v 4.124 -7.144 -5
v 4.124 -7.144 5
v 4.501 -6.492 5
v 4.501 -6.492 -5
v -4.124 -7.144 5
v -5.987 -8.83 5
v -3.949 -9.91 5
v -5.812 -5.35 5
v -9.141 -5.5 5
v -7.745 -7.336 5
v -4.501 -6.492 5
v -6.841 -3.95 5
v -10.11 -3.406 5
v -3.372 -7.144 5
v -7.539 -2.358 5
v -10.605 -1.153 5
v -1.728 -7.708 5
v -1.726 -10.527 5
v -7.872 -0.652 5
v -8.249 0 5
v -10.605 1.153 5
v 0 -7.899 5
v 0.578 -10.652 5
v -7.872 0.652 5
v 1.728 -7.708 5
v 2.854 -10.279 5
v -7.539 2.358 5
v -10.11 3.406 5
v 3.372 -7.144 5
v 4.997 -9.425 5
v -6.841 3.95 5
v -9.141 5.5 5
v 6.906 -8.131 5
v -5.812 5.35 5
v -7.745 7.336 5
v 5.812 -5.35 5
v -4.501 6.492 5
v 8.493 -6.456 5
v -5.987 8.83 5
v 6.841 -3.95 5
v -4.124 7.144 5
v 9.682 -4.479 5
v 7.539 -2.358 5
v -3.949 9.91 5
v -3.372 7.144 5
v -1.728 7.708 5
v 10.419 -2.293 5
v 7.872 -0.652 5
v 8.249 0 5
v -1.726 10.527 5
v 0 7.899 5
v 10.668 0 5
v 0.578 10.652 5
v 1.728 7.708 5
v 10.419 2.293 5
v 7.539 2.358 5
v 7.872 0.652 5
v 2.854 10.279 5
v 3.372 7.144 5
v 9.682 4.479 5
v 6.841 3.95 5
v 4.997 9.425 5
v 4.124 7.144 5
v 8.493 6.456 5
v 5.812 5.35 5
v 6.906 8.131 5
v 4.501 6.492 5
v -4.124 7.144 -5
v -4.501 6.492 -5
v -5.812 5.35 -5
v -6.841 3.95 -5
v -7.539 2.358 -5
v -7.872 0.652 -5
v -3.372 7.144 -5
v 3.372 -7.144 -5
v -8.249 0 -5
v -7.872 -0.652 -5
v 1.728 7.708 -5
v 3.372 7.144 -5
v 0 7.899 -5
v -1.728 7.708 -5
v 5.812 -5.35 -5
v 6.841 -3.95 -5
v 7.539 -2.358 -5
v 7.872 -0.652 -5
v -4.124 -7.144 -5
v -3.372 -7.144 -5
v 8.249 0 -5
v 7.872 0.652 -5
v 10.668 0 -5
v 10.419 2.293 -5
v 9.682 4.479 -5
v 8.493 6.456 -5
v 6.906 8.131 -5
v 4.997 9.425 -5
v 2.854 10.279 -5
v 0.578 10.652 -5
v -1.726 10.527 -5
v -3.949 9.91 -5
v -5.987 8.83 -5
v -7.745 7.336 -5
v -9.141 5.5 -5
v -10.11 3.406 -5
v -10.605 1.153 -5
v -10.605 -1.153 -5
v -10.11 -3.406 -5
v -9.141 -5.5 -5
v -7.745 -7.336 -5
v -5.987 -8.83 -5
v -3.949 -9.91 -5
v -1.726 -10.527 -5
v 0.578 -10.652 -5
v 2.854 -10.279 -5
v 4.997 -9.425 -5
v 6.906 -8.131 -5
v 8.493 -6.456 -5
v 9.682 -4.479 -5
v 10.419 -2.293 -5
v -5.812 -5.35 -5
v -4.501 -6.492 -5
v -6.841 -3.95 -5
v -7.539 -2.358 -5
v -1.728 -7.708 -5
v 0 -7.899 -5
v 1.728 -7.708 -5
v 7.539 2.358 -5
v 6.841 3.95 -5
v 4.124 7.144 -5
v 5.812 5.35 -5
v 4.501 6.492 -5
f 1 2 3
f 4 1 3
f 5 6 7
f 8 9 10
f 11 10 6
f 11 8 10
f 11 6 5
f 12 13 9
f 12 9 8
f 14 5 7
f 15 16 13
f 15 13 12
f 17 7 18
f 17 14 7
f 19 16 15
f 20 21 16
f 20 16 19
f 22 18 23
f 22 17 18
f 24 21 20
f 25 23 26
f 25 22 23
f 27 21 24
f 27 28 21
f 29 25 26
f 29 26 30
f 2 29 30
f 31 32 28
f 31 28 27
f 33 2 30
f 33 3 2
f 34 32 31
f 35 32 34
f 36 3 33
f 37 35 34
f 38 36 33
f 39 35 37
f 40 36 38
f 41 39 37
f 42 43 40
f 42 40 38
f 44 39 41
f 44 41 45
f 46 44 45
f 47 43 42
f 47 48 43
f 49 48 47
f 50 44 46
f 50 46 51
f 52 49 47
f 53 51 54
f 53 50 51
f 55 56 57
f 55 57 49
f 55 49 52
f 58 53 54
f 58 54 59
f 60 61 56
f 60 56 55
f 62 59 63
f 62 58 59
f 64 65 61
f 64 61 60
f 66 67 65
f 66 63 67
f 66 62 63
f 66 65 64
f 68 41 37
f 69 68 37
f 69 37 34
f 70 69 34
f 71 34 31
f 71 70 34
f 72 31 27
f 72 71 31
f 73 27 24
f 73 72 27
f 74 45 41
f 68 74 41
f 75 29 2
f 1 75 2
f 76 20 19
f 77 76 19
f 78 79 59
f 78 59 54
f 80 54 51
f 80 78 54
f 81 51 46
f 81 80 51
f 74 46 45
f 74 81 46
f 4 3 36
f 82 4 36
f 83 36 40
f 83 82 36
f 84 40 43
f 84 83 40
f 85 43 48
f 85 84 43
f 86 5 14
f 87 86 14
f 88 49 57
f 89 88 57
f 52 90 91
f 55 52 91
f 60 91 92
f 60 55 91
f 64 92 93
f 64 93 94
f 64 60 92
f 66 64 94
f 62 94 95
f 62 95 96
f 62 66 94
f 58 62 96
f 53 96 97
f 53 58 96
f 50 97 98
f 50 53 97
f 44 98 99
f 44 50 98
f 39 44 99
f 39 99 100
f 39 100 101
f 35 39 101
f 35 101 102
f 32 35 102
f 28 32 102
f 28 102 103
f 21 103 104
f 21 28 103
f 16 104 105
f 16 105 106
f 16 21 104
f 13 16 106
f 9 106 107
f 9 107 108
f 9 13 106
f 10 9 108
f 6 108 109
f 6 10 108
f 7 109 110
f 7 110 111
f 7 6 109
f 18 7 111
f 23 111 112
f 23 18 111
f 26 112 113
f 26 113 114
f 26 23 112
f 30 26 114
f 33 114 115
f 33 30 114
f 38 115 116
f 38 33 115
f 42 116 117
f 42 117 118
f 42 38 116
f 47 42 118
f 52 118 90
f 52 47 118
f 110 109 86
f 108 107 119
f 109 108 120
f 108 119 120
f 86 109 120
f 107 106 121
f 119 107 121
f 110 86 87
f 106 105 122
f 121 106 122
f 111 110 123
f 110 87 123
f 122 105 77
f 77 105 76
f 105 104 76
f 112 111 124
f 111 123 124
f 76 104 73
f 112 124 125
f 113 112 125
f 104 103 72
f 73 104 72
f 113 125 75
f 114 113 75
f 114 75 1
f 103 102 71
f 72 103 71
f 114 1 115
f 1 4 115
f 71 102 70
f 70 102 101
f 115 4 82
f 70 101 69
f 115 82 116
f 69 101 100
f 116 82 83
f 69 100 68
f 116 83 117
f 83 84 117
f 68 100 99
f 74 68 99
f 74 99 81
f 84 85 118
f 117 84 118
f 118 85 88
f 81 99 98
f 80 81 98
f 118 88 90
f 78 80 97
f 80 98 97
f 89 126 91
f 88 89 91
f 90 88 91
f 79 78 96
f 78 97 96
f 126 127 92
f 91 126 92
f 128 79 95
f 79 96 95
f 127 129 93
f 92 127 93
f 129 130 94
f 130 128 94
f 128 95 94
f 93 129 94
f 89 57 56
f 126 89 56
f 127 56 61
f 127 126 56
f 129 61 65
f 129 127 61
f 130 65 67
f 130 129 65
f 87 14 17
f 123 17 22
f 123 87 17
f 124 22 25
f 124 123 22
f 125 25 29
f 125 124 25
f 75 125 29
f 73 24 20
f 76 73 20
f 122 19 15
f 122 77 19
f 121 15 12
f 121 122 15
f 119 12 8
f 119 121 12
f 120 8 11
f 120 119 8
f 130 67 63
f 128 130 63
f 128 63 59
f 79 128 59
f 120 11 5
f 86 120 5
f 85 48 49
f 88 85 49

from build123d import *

# Parameters (mm, degrees)
SKETCH1_R           = 10.668
SKETCH1_R_2         = 7.8994
EXTRUDE_THIN1_DEPTH = 5
CUT_EXTRUDE3_DEPTH  = 11


with BuildPart() as part:
    # Sketch1 → Extrude-Thin1 (new body, symmetric)
    with BuildSketch(Plane.XY):
        Circle(SKETCH1_R)
        Circle(SKETCH1_R_2, mode=Mode.SUBTRACT)
    extrude(amount=EXTRUDE_THIN1_DEPTH, both=True)

    # Sketch3 → Cut-Extrude3 (cut, through all)
    with BuildSketch(Plane.XY.offset(5)):
        Polygon((4.124445986, 7.14375), (-4.124445986, 7.14375), (-8.248891971, 0), (-4.124445986, -7.14375), (4.124445986, -7.14375), (8.248891971, 0), align=None)
    extrude(amount=-CUT_EXTRUDE3_DEPTH, mode=Mode.SUBTRACT)


solid = part.part
